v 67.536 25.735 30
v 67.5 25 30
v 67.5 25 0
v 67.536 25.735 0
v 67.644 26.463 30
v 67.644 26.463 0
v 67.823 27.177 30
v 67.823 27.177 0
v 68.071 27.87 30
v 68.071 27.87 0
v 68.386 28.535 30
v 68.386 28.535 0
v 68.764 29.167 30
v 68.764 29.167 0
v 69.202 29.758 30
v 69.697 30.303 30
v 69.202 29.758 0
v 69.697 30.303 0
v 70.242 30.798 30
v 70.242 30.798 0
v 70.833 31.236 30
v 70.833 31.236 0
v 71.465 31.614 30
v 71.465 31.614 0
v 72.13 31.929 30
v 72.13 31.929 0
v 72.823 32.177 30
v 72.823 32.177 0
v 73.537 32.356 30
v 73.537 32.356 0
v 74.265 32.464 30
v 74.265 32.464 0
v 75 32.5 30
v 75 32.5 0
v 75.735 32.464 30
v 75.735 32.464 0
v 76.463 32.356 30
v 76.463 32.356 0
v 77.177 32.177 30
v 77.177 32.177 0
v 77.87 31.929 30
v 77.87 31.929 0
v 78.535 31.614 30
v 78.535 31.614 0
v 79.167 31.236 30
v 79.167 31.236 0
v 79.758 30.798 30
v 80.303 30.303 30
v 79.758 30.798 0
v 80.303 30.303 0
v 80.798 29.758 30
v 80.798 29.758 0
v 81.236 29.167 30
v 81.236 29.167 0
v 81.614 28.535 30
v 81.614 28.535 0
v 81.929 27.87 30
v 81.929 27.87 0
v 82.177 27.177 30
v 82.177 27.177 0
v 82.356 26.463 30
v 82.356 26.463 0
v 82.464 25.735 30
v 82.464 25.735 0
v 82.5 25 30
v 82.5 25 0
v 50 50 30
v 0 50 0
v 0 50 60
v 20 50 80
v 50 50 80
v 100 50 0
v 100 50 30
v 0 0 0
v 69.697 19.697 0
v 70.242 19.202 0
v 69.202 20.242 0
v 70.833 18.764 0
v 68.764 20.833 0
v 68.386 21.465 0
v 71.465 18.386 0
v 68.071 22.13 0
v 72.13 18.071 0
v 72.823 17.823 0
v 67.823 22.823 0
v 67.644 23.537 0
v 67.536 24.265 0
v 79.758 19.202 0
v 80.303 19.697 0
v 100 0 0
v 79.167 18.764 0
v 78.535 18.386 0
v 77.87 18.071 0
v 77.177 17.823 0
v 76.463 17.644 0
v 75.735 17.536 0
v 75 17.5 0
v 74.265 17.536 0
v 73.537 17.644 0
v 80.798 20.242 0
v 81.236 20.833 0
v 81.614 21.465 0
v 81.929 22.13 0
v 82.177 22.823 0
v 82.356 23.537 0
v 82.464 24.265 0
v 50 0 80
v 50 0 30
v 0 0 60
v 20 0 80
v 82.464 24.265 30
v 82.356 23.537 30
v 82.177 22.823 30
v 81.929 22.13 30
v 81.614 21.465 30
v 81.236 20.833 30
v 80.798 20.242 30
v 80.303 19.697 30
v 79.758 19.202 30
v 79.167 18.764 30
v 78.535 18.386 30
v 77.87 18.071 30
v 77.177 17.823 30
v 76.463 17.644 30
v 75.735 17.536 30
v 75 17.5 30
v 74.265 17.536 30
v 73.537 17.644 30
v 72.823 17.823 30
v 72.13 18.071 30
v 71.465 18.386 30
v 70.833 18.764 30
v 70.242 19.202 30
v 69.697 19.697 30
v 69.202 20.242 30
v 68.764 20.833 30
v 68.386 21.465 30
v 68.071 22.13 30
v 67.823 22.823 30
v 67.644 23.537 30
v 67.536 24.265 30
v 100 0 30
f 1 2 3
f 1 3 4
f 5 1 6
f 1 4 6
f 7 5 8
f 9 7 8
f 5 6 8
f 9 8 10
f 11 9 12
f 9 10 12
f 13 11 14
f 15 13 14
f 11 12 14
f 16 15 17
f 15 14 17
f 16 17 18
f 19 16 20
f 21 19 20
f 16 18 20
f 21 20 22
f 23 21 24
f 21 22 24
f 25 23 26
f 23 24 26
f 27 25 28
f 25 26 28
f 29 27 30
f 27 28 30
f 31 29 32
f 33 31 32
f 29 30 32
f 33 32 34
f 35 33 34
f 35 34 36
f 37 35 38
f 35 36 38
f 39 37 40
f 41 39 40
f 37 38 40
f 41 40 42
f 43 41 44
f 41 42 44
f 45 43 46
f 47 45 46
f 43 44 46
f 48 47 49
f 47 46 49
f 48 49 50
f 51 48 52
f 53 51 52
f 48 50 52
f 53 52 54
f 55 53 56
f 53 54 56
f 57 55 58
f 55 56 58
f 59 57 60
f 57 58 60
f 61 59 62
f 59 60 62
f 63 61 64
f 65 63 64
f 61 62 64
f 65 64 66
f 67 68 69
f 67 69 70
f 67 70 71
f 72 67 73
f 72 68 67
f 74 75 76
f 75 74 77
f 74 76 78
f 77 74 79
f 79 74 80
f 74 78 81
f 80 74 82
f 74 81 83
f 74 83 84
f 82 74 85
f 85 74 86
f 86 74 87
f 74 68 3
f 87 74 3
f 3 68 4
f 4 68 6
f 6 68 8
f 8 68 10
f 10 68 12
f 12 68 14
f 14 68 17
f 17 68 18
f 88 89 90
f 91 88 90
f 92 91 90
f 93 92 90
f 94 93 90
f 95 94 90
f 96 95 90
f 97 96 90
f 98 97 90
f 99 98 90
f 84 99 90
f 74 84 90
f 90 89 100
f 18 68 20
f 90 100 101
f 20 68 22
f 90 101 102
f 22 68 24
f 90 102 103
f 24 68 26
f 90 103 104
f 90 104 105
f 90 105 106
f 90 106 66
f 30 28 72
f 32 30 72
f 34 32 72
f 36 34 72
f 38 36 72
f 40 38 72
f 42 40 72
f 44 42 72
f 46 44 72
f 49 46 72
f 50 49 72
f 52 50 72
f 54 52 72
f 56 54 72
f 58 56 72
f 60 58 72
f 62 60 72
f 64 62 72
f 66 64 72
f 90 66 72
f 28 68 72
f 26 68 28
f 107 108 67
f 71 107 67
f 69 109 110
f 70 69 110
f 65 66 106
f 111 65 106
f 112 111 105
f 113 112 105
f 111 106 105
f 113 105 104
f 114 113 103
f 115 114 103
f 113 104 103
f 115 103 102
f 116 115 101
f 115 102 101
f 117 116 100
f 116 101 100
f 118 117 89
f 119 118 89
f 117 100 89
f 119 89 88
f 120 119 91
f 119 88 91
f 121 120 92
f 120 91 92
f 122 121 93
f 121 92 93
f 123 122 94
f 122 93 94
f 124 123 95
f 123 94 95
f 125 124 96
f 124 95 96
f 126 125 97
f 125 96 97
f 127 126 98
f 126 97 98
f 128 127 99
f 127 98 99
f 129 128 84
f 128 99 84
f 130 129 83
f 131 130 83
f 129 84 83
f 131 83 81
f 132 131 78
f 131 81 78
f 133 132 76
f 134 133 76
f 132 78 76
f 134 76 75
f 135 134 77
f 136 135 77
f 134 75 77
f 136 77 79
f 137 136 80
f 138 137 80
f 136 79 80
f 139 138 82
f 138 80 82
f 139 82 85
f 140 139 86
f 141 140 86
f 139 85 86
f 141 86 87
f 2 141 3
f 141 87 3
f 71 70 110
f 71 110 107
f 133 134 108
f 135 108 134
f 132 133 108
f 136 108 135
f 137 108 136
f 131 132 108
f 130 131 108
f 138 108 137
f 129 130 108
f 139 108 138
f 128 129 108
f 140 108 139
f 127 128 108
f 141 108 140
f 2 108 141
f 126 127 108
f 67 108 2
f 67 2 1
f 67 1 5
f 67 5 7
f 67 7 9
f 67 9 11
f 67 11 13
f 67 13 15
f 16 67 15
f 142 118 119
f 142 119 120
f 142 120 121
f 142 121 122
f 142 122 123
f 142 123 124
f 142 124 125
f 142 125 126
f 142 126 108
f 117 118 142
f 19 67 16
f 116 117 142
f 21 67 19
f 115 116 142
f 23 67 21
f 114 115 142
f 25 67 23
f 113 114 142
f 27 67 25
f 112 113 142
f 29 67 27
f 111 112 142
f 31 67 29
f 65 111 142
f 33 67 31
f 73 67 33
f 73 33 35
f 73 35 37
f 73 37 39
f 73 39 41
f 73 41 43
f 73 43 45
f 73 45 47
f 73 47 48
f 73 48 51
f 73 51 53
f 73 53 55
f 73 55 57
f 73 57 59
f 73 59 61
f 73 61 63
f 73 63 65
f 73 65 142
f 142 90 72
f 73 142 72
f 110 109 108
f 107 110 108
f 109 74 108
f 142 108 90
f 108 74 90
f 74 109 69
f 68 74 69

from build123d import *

# Parameters (mm, degrees)
F0_W     = 100
F0_H     = 50
F1_DEPTH = 30
F2_W     = 50
F2_H     = 50
F3_DEPTH = 50
F5_DEPTH = 50
F7_DEPTH = 30


with BuildPart() as f1:
    # F0 (on Top) → F1 (new body)
    with BuildSketch(Plane.XY):
        with Locations((50, 25)):
            Rectangle(F0_W, F0_H)
    extrude(amount=F1_DEPTH)

    # F2 (on face) → F3 (join)
    with BuildSketch(Plane.XY.offset(30)):
        with Locations((25, 25)):
            Rectangle(F2_W, F2_H)
    extrude(amount=F3_DEPTH)

    # F4 (on face) → F5 (cut, through all)
    with BuildSketch(Plane.XZ):
        Polygon((20, 80), (0, 80), (0, 60), align=None)
    extrude(amount=-F5_DEPTH, mode=Mode.SUBTRACT)

    # F6 (on face) → F7 (cut, through all)
    with BuildSketch(Plane(origin=(0, 0, 0), x_dir=(1, 0, 0), z_dir=(0, 0, -1))):
        with BuildLine():
            Line((75, -25), (67.5, -25))
            ThreePointArc((67.5, -25), (69.696699, -30.303301), (75, -32.5))
            Line((75, -32.5), (75, -25))
        make_face()
        with BuildLine():
            ThreePointArc((82.5, -25), (75, -17.5), (67.5, -25))
            Line((67.5, -25), (75, -25))
            Line((75, -25), (75, -32.5))
            ThreePointArc((75, -32.5), (80.303301, -30.303301), (82.5, -25))
        make_face()
    extrude(amount=-F7_DEPTH, mode=Mode.SUBTRACT)


solid = f1.part
